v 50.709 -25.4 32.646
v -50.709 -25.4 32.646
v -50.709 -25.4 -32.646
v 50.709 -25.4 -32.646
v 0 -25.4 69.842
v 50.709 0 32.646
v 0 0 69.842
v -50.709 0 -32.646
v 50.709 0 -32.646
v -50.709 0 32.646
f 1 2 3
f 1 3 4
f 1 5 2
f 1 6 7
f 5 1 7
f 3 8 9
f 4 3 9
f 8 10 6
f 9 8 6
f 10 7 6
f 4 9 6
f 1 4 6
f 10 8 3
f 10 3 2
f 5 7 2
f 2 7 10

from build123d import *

# Parameters (mm, degrees)
F0_W     = 101.417362
F0_H     = 65.29244
F1_DEPTH = 25.4


with BuildPart() as f1:
    # F0 (on Front) → F1 (new body)
    with BuildSketch(Plane.XZ):
        Rectangle(F0_W, F0_H)
        Polygon((-50.708681, 32.64622), (50.708681, 32.64622), (0, 69.841512), align=None)
    extrude(amount=F1_DEPTH)


solid = f1.part
